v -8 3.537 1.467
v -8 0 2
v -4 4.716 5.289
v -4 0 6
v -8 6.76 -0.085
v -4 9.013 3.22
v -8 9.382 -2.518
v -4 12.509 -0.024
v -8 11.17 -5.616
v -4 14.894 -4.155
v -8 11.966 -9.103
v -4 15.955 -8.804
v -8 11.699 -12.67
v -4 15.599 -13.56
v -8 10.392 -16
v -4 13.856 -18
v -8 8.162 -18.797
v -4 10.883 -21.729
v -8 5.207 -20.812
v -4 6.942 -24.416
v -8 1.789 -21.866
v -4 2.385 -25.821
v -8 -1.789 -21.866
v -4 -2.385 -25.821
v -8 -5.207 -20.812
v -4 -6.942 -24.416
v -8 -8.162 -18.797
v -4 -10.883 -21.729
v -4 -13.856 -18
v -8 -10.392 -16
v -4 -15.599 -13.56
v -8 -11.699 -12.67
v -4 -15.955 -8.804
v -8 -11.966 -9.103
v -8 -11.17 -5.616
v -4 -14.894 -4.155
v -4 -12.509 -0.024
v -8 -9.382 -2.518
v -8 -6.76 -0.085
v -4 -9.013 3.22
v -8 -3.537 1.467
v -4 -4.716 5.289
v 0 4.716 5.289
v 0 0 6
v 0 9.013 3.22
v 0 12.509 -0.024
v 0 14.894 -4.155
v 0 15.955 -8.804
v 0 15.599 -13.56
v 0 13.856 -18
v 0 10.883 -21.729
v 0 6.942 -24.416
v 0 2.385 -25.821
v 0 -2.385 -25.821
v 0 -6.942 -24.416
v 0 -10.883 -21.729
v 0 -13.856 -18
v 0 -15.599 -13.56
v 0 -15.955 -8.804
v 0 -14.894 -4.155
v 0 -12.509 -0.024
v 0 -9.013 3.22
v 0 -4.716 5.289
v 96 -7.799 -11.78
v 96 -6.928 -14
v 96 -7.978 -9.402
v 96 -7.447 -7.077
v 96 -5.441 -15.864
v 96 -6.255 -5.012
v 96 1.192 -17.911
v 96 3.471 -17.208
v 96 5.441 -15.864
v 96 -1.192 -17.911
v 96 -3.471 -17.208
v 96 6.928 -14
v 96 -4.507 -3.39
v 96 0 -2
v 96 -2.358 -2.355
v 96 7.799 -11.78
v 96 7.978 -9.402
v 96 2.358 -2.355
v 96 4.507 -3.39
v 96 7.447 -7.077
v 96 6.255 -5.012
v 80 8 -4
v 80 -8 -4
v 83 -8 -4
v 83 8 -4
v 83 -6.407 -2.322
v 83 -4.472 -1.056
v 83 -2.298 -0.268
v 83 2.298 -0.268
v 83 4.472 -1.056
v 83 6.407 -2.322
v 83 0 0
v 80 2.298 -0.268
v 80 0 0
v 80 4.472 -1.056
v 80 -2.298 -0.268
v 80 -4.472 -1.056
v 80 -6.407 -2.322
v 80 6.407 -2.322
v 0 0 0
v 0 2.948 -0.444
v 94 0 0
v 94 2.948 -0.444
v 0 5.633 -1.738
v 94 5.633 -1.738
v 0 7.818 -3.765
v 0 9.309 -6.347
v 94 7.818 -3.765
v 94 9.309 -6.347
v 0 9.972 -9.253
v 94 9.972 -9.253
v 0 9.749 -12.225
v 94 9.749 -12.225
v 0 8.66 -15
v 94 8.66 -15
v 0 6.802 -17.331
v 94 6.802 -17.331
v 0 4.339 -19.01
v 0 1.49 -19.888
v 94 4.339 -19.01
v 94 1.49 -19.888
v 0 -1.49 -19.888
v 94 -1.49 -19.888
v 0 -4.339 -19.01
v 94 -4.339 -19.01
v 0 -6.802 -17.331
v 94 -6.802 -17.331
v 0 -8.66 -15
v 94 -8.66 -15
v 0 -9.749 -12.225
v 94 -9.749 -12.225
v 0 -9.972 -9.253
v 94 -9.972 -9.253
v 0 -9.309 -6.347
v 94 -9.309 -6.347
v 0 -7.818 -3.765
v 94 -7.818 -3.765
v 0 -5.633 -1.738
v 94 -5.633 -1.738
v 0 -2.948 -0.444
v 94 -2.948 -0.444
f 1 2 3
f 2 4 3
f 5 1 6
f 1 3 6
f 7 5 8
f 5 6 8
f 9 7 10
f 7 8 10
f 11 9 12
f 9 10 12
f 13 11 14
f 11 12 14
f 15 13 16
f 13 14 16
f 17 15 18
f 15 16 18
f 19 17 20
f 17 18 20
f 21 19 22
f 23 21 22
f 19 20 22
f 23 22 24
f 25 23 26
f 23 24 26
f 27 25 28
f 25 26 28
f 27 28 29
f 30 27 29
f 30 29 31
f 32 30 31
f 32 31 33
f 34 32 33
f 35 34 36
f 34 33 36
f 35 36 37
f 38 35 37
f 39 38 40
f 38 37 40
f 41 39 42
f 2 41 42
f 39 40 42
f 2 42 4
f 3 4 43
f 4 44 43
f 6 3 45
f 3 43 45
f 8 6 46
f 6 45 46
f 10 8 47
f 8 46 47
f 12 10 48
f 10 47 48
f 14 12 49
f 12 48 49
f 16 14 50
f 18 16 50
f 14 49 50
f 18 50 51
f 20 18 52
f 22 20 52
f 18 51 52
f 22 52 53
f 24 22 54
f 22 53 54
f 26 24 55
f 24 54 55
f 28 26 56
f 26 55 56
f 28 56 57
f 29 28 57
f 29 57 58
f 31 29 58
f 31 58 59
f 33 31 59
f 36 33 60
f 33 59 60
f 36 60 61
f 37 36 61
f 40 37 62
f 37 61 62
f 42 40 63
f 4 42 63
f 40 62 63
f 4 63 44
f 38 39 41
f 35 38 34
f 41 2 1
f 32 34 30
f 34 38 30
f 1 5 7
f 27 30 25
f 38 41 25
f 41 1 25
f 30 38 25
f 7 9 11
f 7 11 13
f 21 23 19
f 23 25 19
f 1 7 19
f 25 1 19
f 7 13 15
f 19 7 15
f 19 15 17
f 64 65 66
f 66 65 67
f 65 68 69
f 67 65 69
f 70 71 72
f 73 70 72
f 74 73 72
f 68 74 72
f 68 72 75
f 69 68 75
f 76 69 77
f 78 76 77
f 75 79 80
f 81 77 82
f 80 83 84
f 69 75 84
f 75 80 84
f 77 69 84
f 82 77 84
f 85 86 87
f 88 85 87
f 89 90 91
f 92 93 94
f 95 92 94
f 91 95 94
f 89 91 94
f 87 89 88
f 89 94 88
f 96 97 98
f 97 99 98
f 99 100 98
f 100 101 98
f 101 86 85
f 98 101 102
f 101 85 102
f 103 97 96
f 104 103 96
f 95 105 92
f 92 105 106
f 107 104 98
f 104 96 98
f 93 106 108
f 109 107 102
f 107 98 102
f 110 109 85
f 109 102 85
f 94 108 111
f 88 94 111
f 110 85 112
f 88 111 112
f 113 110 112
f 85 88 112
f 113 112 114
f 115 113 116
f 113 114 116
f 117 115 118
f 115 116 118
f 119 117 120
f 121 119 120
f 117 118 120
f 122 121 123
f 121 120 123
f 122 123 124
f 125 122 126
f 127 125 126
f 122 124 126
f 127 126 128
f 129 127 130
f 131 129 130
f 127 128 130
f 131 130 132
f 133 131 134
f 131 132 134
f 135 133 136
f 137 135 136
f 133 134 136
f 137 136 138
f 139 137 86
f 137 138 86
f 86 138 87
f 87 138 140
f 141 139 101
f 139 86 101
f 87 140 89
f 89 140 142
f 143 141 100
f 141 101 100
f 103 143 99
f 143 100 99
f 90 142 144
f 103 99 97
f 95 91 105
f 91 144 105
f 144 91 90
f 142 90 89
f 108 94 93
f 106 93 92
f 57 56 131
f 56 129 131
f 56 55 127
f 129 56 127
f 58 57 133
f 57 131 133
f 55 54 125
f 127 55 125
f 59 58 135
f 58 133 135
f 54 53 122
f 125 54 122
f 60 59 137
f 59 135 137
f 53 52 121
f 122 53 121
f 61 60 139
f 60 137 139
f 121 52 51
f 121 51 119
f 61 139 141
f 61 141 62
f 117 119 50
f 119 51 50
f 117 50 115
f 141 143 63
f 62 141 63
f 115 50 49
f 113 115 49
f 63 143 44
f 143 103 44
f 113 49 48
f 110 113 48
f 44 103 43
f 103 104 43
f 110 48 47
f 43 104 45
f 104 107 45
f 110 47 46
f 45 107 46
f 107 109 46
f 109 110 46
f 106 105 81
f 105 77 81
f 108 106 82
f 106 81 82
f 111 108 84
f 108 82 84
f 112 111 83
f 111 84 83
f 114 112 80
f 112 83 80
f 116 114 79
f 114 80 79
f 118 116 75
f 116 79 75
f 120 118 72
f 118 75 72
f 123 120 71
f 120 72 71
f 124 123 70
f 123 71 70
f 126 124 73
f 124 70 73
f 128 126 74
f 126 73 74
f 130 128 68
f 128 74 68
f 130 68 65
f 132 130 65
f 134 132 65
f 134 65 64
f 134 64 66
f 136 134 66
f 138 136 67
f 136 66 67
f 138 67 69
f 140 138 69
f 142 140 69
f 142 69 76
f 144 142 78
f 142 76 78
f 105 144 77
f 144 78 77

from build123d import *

# Parameters (mm, degrees)
CUT_EXTRUDE2_DEPTH      = 1
CUT_EXTRUDE2_DEPTH_BACK = 57


with BuildPart() as part:
    # Sketch1 → Revolve1 (revolve)
    with BuildSketch(Plane(origin=(0, 0, 0), x_dir=(1, 0, 0), z_dir=(0, 1, 0))):
        Polygon((0, 0), (94, 0), (96, 2), (96, 10), (-8, 10), (-8, -2), (-4, -6), (0, -6), align=None)
    revolve(axis=Axis((67.877257865, 0, -10), (-1, 0, 0)))

    # Sketch2 → Cut-Extrude2 (cut, two sides)
    with BuildSketch(Plane(origin=(0, 40, 0), x_dir=(1, 0, 0), z_dir=(0, 1, 0))) as cut_extrude2_sk:
        Polygon((80, -199.282857121), (80, 0), (80, 4), (83, 4), (83, 0), (83, -199.282857121), (83, -597.848571364), (80, -597.848571364), align=None)
    extrude(amount=CUT_EXTRUDE2_DEPTH, mode=Mode.SUBTRACT)
    extrude(cut_extrude2_sk.sketch, amount=-CUT_EXTRUDE2_DEPTH_BACK, mode=Mode.SUBTRACT)


solid = part.part
